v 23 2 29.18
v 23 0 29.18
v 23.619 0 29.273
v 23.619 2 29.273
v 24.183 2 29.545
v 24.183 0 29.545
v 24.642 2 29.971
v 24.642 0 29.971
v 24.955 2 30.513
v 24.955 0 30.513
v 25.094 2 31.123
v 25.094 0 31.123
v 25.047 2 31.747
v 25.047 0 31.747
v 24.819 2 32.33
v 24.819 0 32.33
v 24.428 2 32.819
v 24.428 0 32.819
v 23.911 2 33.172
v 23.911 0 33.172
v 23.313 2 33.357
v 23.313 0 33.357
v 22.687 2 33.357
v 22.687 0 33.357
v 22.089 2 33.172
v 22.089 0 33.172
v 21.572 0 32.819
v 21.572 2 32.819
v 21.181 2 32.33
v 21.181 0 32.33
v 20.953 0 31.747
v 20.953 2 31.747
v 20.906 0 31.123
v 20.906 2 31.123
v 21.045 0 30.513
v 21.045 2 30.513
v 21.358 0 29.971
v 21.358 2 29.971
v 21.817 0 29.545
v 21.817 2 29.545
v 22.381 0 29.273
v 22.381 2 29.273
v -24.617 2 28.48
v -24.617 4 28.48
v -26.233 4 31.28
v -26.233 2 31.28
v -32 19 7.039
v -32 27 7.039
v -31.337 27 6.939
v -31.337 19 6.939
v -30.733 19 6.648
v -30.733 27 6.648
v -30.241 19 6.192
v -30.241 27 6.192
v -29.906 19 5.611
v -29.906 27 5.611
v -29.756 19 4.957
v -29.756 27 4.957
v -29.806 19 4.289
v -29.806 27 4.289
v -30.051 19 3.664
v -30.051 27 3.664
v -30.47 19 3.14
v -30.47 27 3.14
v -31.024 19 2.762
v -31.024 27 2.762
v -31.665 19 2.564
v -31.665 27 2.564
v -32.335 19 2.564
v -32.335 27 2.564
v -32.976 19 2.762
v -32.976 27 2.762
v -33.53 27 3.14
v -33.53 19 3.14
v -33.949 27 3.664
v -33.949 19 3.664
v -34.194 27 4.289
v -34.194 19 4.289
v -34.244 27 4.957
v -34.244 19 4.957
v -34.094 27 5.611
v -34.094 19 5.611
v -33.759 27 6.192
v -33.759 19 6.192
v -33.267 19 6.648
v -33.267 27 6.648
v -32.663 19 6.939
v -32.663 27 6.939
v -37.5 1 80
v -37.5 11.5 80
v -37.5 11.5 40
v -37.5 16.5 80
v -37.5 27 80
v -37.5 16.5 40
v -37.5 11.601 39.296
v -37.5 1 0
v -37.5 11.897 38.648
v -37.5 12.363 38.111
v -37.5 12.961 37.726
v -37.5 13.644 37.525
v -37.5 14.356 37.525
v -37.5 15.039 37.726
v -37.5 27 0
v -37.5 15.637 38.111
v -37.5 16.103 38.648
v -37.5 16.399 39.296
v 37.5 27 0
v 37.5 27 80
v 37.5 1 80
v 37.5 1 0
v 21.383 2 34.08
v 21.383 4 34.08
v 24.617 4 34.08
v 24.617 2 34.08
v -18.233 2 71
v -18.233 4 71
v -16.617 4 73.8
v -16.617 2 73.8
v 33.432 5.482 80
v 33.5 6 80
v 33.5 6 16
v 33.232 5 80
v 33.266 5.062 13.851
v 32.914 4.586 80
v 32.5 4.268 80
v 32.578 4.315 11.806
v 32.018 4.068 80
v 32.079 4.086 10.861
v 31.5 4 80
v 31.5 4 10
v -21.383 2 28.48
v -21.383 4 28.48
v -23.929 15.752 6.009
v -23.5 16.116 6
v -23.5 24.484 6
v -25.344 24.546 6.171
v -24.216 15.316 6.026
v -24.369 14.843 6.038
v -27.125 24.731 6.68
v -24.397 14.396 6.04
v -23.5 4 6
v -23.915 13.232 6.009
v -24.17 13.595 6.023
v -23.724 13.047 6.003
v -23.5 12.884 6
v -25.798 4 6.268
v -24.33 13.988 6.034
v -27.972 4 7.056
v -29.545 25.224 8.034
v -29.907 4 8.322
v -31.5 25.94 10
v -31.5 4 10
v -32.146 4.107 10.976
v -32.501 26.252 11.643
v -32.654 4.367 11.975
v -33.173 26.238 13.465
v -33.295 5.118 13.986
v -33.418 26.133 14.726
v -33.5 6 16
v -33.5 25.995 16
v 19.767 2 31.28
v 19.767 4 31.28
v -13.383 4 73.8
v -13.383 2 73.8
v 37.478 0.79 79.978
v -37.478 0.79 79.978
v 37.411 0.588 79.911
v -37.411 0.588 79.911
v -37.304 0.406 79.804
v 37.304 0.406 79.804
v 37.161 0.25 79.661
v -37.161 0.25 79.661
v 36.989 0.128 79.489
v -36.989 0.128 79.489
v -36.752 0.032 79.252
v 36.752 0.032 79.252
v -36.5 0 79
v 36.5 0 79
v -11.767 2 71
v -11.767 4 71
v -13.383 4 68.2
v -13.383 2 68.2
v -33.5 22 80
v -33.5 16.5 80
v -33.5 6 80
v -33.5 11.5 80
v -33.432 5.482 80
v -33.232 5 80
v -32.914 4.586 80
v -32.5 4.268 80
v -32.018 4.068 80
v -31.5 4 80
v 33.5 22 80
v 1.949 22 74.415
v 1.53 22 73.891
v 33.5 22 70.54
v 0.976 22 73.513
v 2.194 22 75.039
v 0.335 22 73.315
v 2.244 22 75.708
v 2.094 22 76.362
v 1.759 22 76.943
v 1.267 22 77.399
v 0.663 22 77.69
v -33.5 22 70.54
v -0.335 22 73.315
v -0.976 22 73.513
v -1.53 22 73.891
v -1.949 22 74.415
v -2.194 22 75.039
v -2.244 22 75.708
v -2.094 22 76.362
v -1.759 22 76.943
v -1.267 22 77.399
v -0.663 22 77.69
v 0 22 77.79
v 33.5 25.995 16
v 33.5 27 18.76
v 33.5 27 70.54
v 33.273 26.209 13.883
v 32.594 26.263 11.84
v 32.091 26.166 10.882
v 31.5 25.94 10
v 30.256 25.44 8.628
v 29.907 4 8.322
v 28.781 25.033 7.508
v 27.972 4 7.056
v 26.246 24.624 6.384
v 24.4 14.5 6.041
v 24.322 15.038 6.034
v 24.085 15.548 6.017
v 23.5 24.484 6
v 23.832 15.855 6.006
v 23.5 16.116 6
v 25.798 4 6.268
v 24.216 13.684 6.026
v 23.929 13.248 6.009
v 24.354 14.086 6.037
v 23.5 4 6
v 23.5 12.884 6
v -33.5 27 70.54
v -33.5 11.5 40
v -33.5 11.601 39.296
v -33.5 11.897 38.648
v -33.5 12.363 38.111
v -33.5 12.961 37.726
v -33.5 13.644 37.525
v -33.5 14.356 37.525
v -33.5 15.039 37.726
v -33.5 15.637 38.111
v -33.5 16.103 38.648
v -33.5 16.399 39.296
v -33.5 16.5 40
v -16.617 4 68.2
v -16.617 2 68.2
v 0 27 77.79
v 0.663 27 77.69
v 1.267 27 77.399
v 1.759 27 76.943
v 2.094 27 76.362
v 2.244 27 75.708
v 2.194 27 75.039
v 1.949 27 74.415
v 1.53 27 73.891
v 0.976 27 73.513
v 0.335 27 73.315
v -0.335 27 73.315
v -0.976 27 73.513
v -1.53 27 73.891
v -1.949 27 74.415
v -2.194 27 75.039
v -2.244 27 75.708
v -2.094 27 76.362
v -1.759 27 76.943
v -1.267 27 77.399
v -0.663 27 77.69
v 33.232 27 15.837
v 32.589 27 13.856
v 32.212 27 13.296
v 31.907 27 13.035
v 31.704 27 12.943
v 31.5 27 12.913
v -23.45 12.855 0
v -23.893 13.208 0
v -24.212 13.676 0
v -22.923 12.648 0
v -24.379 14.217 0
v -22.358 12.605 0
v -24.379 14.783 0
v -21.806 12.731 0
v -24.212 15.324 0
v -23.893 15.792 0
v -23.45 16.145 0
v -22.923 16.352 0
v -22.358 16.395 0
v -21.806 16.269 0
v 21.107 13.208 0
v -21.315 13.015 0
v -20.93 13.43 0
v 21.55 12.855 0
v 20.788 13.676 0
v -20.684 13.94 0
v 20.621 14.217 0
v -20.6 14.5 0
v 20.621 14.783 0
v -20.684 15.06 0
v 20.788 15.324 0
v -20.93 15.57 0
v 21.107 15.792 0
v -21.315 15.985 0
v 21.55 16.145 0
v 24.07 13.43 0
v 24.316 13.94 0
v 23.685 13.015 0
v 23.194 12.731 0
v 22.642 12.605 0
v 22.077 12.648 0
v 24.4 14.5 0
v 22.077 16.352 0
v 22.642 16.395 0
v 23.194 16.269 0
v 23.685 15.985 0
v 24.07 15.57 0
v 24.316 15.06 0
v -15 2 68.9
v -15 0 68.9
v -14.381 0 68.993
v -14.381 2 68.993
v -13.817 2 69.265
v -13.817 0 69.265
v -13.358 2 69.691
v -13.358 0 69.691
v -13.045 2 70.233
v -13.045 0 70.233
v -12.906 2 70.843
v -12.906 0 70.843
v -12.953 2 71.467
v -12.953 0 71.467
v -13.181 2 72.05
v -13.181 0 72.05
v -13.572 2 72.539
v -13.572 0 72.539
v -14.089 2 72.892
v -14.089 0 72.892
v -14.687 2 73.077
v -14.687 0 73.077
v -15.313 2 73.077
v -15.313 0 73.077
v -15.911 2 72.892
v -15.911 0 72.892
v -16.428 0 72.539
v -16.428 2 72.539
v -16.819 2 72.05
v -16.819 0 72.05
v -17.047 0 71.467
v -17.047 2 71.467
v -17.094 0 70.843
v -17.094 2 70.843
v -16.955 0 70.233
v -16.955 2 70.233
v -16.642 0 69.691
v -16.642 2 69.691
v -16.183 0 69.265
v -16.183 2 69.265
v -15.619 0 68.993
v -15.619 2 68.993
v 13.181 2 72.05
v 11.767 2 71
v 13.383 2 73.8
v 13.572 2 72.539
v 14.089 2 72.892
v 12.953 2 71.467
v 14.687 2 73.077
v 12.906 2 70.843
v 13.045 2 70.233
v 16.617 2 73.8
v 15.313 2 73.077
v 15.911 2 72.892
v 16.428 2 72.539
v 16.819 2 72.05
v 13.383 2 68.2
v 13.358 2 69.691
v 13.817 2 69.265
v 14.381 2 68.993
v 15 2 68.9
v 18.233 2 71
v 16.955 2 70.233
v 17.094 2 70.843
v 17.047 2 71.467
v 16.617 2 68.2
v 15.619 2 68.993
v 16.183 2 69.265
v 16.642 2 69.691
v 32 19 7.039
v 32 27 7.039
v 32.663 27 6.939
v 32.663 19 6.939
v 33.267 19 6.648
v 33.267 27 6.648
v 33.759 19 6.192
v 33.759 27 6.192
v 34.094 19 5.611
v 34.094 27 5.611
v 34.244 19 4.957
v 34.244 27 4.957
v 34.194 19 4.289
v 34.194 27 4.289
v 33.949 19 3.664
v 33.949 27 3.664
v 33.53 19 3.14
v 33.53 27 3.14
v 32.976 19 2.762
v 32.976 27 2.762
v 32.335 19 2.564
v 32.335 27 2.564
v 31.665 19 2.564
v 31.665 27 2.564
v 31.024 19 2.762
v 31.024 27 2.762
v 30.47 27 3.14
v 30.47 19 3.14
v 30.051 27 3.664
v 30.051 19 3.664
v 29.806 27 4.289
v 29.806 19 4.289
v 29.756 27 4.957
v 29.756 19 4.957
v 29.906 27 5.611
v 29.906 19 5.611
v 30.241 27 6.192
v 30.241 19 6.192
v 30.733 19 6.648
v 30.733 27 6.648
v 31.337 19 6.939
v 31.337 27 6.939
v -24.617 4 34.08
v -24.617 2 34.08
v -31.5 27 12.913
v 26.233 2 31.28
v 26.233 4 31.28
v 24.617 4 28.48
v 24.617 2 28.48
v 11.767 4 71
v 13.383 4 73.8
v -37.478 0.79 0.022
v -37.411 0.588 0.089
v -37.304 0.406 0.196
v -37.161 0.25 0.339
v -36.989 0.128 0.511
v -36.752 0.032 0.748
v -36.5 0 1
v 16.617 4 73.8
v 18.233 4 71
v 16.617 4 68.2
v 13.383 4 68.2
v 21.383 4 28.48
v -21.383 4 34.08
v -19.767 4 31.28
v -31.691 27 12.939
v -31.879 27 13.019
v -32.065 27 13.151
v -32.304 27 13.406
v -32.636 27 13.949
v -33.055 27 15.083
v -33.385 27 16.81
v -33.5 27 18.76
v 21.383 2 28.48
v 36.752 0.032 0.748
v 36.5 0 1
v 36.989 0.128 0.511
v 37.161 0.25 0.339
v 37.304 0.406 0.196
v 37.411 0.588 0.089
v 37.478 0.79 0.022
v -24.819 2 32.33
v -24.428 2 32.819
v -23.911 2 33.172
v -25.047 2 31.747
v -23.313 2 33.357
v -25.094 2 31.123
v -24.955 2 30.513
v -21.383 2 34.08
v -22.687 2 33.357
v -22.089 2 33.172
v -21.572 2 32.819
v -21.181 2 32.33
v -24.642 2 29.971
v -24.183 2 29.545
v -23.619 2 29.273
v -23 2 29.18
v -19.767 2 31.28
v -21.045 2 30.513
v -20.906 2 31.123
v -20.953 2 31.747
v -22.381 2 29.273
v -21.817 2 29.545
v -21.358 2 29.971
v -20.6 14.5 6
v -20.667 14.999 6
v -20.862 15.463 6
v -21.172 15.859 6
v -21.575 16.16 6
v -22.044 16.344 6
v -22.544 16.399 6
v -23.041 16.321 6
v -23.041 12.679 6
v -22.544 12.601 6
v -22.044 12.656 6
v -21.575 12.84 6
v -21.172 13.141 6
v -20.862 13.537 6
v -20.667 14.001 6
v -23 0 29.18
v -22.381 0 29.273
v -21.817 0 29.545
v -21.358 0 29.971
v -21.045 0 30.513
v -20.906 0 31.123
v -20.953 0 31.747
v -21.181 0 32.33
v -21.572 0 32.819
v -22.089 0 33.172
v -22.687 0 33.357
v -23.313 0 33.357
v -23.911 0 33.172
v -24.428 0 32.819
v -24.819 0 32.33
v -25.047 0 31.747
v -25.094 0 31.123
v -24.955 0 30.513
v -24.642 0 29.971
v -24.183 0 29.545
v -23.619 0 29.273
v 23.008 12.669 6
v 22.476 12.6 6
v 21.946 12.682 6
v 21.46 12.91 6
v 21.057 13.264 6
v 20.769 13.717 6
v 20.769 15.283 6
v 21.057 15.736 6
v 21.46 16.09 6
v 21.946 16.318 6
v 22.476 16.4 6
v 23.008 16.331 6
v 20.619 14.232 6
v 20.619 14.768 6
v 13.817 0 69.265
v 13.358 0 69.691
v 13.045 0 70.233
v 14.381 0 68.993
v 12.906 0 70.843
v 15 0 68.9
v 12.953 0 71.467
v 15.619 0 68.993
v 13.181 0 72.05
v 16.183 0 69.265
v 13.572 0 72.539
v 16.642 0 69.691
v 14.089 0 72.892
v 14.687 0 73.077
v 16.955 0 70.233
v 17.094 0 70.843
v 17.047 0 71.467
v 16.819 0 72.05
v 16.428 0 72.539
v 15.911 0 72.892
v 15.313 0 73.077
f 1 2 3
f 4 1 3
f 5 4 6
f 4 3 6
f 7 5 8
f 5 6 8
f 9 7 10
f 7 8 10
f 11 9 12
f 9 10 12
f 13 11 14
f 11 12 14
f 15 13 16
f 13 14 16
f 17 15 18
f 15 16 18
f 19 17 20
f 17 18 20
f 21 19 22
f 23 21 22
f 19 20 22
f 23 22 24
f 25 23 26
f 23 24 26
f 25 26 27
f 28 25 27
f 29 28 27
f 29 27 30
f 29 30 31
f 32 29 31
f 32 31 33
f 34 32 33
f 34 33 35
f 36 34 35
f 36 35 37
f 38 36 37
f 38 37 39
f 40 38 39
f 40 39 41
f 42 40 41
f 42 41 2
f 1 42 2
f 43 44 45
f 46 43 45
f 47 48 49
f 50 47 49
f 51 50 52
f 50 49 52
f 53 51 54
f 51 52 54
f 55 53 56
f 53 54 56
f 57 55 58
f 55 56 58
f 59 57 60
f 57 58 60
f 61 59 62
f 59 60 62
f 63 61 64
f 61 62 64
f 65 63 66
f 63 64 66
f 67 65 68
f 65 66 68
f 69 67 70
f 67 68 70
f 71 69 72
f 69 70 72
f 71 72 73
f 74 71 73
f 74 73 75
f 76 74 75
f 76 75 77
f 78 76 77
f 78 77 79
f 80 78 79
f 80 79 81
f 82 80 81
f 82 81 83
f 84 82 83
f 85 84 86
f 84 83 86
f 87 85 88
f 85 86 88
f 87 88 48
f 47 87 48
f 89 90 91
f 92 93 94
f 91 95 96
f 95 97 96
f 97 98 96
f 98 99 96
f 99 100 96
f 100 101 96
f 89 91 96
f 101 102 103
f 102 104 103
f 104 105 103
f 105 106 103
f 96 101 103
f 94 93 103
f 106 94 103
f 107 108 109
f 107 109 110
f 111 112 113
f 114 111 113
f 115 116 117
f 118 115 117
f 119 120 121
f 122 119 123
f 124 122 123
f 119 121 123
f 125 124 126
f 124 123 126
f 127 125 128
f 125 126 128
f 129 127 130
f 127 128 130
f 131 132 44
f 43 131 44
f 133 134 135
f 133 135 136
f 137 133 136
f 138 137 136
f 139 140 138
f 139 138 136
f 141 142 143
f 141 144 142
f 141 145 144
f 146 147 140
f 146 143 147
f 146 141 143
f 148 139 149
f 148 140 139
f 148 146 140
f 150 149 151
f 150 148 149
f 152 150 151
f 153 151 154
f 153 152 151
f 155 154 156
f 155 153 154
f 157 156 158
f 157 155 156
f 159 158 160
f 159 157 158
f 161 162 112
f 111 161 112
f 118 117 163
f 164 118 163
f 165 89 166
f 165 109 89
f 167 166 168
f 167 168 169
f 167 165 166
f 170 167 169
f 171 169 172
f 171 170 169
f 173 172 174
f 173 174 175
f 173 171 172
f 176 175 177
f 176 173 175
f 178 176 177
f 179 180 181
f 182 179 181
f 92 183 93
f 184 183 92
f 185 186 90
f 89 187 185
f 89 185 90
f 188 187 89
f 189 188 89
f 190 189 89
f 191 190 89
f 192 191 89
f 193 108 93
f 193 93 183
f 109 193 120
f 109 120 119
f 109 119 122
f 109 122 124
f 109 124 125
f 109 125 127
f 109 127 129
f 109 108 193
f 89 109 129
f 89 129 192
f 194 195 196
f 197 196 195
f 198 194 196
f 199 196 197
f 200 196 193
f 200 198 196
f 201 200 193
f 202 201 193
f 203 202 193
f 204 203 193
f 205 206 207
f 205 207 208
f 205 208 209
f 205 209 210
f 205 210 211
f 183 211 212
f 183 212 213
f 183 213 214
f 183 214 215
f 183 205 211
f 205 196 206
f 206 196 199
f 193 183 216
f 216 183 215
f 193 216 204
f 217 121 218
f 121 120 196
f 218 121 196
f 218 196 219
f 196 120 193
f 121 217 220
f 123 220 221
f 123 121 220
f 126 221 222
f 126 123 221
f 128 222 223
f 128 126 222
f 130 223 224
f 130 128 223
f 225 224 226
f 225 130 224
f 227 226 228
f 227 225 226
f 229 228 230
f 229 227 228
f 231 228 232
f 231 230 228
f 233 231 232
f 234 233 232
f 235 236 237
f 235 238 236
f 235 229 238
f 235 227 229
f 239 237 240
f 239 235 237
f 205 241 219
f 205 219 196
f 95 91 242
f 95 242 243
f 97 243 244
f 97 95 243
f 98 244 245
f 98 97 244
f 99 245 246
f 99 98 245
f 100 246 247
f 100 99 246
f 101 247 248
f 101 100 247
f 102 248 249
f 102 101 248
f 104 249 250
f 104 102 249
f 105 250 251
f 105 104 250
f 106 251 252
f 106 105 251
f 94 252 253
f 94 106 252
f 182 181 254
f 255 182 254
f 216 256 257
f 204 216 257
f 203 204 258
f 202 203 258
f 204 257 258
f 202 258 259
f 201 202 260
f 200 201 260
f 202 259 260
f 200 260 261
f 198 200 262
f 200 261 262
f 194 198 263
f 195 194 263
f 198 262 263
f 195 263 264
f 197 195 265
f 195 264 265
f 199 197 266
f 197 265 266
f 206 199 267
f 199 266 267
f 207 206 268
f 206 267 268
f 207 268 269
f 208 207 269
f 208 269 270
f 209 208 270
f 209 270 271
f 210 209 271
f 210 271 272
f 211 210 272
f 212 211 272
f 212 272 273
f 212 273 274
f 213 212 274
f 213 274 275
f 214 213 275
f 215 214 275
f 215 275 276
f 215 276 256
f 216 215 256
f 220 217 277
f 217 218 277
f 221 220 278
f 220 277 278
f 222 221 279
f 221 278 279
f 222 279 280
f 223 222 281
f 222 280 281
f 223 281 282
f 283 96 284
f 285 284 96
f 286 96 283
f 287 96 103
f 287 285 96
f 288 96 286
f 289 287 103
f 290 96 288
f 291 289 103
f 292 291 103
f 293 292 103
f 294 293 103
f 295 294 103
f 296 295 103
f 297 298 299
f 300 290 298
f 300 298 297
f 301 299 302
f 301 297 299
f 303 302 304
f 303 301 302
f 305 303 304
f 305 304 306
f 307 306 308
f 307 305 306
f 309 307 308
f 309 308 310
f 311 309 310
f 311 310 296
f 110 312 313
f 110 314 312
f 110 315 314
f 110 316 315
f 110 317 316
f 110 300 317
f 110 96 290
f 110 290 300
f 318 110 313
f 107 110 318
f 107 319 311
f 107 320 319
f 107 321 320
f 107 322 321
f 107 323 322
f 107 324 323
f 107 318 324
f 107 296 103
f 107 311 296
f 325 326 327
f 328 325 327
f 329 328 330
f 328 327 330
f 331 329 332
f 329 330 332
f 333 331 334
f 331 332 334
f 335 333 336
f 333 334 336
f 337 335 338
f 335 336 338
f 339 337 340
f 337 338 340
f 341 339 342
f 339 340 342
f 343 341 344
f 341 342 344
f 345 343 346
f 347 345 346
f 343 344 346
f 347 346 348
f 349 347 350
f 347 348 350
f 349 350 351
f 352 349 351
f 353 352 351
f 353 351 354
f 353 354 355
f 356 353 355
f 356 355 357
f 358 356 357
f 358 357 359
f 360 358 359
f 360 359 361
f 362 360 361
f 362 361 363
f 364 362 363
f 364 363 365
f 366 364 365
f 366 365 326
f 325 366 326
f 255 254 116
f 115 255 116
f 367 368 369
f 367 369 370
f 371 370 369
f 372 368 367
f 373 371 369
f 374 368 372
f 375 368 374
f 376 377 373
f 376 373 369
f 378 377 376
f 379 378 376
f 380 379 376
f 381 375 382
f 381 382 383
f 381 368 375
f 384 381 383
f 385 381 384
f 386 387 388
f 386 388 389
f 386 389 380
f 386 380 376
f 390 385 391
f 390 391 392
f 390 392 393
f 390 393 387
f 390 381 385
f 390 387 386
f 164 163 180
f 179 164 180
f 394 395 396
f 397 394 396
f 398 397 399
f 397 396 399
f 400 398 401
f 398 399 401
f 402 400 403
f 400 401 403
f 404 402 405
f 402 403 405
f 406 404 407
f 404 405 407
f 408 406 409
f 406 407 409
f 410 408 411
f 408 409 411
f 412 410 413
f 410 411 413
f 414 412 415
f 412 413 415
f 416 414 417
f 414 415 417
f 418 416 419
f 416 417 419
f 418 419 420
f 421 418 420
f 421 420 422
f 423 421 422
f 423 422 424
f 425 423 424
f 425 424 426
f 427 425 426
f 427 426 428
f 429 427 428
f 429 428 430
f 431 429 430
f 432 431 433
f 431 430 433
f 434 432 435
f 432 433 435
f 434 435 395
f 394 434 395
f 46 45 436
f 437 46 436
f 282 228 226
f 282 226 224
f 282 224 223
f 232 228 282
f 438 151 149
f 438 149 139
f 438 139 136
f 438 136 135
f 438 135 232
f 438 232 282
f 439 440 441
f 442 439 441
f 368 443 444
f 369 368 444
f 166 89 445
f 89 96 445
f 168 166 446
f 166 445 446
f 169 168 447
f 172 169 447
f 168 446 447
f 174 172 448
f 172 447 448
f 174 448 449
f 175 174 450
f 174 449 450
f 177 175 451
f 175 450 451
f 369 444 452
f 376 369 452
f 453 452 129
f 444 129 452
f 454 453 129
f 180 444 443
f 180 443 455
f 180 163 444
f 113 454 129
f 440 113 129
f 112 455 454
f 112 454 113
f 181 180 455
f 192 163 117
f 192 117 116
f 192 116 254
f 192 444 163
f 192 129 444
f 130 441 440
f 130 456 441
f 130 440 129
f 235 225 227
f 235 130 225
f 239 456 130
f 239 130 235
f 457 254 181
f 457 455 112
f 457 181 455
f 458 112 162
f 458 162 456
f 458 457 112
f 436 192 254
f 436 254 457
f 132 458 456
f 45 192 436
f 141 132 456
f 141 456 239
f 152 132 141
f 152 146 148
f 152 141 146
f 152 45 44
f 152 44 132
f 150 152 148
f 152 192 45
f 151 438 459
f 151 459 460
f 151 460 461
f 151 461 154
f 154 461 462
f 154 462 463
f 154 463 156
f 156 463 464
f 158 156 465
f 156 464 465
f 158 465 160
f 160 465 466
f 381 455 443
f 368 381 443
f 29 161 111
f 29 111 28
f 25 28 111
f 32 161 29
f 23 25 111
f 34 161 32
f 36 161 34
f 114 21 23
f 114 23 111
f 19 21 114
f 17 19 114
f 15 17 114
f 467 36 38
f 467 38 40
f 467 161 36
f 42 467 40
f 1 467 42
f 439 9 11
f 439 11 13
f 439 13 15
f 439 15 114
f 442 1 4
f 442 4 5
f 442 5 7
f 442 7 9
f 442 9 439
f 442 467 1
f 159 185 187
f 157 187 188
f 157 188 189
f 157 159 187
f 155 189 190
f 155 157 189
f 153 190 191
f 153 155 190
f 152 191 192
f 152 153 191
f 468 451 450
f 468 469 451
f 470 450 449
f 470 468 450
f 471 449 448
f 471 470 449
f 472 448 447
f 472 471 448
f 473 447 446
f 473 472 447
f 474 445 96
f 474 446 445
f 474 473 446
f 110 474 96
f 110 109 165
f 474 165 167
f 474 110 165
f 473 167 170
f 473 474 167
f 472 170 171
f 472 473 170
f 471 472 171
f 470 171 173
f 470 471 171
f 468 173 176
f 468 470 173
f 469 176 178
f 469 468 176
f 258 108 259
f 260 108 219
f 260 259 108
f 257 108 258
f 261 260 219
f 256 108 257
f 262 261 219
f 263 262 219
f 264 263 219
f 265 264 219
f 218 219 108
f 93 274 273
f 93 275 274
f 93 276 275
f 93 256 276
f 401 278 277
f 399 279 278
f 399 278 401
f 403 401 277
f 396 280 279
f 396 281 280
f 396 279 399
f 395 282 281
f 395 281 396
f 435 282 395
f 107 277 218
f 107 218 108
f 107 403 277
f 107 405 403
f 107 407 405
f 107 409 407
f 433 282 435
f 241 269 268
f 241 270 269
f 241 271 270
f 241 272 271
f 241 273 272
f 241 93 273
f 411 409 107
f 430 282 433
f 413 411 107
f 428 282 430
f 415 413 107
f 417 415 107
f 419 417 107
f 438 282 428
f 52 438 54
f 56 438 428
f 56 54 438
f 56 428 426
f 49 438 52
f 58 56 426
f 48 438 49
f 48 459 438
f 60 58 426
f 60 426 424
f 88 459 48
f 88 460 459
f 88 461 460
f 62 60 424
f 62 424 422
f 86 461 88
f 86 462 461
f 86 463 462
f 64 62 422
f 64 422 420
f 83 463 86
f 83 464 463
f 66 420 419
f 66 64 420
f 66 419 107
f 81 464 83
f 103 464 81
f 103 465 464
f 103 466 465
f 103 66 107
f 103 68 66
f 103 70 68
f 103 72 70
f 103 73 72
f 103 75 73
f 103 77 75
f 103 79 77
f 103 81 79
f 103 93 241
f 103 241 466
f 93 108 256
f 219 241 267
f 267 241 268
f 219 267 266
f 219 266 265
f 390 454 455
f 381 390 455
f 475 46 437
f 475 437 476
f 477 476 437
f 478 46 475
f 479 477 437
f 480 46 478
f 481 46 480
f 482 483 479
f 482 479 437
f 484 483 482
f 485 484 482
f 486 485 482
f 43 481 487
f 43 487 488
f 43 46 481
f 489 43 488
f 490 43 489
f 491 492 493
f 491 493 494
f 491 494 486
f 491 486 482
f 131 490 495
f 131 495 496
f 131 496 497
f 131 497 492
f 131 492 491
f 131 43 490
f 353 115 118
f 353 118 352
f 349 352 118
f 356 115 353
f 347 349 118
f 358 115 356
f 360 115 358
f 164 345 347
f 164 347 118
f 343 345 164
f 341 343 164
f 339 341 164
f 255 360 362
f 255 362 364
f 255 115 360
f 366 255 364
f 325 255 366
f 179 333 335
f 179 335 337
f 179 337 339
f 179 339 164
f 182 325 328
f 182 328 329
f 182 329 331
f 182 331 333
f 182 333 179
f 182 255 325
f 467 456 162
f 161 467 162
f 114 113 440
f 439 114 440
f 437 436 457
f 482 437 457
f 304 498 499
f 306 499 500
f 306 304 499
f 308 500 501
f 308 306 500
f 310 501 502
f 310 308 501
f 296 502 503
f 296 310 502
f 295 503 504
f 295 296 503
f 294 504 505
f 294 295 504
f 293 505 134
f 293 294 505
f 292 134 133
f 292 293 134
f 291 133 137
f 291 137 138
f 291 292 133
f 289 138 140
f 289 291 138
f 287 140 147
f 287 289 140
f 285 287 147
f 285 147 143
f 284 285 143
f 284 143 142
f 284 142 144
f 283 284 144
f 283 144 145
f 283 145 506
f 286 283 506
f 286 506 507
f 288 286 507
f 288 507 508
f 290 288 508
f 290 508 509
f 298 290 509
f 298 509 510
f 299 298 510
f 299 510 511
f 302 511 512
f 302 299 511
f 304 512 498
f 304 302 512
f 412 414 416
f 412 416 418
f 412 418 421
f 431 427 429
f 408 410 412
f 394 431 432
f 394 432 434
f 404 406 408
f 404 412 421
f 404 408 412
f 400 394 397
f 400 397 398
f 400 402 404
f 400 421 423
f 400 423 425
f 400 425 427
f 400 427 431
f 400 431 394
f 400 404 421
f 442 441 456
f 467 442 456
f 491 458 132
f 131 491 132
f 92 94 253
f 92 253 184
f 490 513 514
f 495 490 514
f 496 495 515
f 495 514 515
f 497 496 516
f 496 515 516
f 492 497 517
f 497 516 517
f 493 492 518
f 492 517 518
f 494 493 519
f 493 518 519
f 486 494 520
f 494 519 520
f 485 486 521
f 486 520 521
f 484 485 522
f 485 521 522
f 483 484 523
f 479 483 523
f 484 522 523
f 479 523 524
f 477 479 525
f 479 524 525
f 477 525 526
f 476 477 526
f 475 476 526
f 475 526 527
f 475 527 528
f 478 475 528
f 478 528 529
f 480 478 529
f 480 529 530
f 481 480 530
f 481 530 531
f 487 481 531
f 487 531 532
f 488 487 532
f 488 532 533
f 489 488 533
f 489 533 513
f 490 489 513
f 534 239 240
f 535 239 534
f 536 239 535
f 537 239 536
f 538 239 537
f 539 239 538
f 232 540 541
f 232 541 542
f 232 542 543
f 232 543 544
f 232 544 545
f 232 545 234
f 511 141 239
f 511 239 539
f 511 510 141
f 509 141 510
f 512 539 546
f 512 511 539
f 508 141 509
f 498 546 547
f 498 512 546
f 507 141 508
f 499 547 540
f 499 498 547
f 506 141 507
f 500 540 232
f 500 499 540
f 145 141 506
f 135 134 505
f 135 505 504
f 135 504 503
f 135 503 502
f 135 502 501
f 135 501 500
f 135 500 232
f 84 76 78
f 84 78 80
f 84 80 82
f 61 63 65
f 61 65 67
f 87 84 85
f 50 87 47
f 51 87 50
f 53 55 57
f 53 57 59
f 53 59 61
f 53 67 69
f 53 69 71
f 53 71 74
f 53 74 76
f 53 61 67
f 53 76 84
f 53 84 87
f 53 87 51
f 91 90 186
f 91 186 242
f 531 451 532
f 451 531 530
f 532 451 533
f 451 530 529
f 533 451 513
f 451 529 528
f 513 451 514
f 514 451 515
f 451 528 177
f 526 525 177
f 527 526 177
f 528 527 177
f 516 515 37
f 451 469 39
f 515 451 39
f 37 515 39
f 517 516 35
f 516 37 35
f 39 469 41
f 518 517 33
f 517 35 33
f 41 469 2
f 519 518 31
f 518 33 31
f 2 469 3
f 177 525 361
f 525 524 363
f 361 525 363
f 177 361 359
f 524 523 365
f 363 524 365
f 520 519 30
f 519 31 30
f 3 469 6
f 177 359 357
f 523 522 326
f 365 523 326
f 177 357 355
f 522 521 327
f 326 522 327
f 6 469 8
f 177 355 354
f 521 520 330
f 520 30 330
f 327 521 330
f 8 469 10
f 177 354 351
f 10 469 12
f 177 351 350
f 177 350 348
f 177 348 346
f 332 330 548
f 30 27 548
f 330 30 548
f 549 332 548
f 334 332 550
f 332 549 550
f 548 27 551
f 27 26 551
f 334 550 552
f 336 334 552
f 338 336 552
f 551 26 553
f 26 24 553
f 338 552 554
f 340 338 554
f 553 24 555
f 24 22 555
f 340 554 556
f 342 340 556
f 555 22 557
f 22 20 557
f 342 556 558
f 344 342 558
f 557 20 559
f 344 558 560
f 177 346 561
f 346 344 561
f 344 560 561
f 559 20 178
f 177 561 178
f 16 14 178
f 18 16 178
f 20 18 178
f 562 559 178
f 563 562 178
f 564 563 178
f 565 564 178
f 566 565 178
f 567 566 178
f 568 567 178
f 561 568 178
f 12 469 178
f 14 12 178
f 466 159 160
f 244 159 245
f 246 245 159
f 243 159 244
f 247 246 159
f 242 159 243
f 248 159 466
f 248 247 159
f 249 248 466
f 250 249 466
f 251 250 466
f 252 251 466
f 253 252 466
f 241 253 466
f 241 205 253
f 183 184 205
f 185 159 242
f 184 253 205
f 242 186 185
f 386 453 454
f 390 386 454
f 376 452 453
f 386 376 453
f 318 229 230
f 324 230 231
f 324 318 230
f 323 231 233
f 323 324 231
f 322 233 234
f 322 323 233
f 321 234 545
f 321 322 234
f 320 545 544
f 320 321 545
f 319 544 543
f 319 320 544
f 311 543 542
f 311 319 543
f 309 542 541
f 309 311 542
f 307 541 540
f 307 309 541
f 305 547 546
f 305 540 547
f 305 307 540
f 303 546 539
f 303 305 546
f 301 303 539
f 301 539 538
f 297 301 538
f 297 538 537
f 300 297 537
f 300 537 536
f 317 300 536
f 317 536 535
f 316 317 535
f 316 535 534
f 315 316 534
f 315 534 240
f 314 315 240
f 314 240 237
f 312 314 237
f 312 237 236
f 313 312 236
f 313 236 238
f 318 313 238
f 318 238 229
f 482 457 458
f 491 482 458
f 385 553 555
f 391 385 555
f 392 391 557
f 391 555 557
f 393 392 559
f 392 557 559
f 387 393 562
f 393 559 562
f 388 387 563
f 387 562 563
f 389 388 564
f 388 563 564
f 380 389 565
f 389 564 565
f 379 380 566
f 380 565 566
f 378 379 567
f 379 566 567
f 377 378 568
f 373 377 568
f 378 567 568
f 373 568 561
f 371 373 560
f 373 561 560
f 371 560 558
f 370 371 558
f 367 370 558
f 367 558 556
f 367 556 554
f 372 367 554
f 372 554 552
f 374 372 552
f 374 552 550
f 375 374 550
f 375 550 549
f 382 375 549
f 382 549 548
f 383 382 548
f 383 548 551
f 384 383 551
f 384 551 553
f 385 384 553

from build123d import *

# Parameters (mm, degrees)
EXTRUDE_1_DEPTH          = 37.5
SHELL_START              = -33.5
SHELL_1_DEPTH            = 67
FILLET_1_R               = 5
FILLET_3_R               = 2
FILLET_4_R               = 1
FILLET_5_R               = 10
CUT_EXTRUDE_2_DEPTH      = 94.307288118
CUT_EXTRUDE_2_DEPTH_BACK = 3
SKETCH_3_R               = 1.9
CUT_EXTRUDE_1_DEPTH      = 103.419810279
CUT_EXTRUDE_1_DEPTH_BACK = 103.419810279
SKETCH_2_W               = 80
SKETCH_2_H               = 35
SKETCH_5_R               = 2.25
CUT_EXTRUDE_4_DEPTH      = 8
CUT_EXTRUDE_5_DEPTH      = 88.242478302
CUT_EXTRUDE_5_DEPTH_BACK = 88.242478302
SKETCH_6_R               = 1.9
CUT_EXTRUDE_6_REACH      = 114.934
CUT_EXTRUDE_7_REACH      = 94.386
SKETCH_8_R               = 2.1
CUT_EXTRUDE_8_DEPTH      = 2


# Read off the part's stored shape, not the designer's step: 抽壳1
with BuildPart() as part:
    # 草图1 → 凸台-拉伸1 (new, symmetric)
    with BuildSketch(Plane(origin=(0, 0, 0), x_dir=(0, 0, -1), z_dir=(1, 0, 0))):
        Polygon((-70.540010176, 52.231309316), (-70.540010176, 30), (-80, 30), (-80, 0), (0, 0), (0, 30), (-9.459989824, 30), align=None)
    extrude(amount=EXTRUDE_1_DEPTH, both=True)

    # 抽壳1 outline → 抽壳1 (cut)
    with BuildSketch(Plane.YZ.offset(SHELL_START)):
        Polygon((47.974598226, 70.540010176), (22, 70.540010176), (22, 80), (4, 80), (4, 6), (24.483955603, 6), align=None)
    extrude(amount=SHELL_1_DEPTH, mode=Mode.SUBTRACT)

    # 圆角1
    fillet_1_edges = [part.edges().sort_by_distance(p)[0] for p in [
        (0, 30, 9.459989824),
        (35.5, 30, 70.540010176),
        (-35.5, 30, 70.540010176),
    ]]
    fillet(fillet_1_edges, radius=FILLET_1_R)

    # 圆角3
    fillet_3_edges = [part.edges().sort_by_distance(p)[0] for p in [
        (33.5, 4, 43),
        (33.5, 36.229276914, 38.270005088),
        (-33.5, 36.229276914, 38.270005088),
        (-33.5, 4, 43),
    ]]
    fillet(fillet_3_edges, radius=FILLET_3_R)

    # 圆角4
    fillet_4_edges = [part.edges().sort_by_distance(p)[0] for p in [
        (-37.5, 30, 4.28917746),
        (-37.5, 30.075961235, 9.446595809),
        (37.5, 30, 4.28917746),
        (37.5, 30.075961235, 9.446595809),
        (-37.5, 41.266423106, 40.414232907),
        (0, 52.231309316, 70.540010176),
        (37.5, 41.266423106, 40.414232907),
        (37.5, 0, 40),
        (-37.5, 0, 40),
        (0, 0, 80),
        (0, 0, 0),
        (0, 30, 0),
        (0, 30, 80),
    ]]
    fillet(fillet_4_edges, radius=FILLET_4_R)

    # 圆角5
    # the kernel refuses this fillet: 10 mm, written as the material it adds along each edge
    with BuildSketch(Plane(origin=(33.5, -19, 6), x_dir=(0, 0, 1), z_dir=(0, 1, 0))) as fillet_5_piece_1_section:
        with BuildLine():
            CenterArc((FILLET_5_R, -FILLET_5_R), FILLET_5_R, 90, 90)
            Line((0, -FILLET_5_R), (0, 0))
            Line((0, 0), (FILLET_5_R, 0))
        make_face()
    fillet_5_piece_1 = extrude(amount=66.355600058, mode=Mode.PRIVATE)
    fillet_5_piece_1 = split(fillet_5_piece_1, bisect_by=Plane(origin=(31.283756862, 30, 8.259643185), z_dir=(0, -1, 0)), keep=Keep.TOP, mode=Mode.PRIVATE)
    fillet_5_piece_1 = split(fillet_5_piece_1, bisect_by=Plane(origin=(31.283756862, 0, 8.259643185), z_dir=(0, 1, 0)), keep=Keep.TOP, mode=Mode.PRIVATE)
    add(fillet_5_piece_1)
    with BuildSketch(Plane(origin=(-33.5, -19, 6), x_dir=(0, 0, 1), z_dir=(0, 1, 0))) as fillet_5_piece_2_section:
        with BuildLine():
            CenterArc((FILLET_5_R, FILLET_5_R), FILLET_5_R, 180, 90)
            Line((0, FILLET_5_R), (0, 0))
            Line((0, 0), (FILLET_5_R, 0))
        make_face()
    fillet_5_piece_2 = extrude(amount=66.355600058, mode=Mode.PRIVATE)
    fillet_5_piece_2 = split(fillet_5_piece_2, bisect_by=Plane(origin=(-31.283756862, 30, 8.259643185), z_dir=(0, -1, 0)), keep=Keep.TOP, mode=Mode.PRIVATE)
    fillet_5_piece_2 = split(fillet_5_piece_2, bisect_by=Plane(origin=(-31.283756862, 0, 8.259643185), z_dir=(0, 1, 0)), keep=Keep.TOP, mode=Mode.PRIVATE)
    add(fillet_5_piece_2)

    # 草图3 → 切除-拉伸2 (cut, two sides: drawn at the far end of the back side and taken through both)
    with BuildSketch(Plane(origin=(0, 30, 0), x_dir=(1, 0, 0), z_dir=(0, 1, 0)).offset(-CUT_EXTRUDE_2_DEPTH_BACK)):
        with Locations(Location((-32, -4.78917746, 0), (0, 0, 90))):
            Circle(SKETCH_3_R)
        with Locations(Location((32, -4.78917746, 0), (0, 0, 90))):
            Circle(SKETCH_3_R)
        with Locations(Location((0, -75.540010176, 0), (0, 0, 90))):
            Circle(SKETCH_3_R)
    extrude(amount=CUT_EXTRUDE_2_DEPTH + CUT_EXTRUDE_2_DEPTH_BACK, mode=Mode.SUBTRACT)

    # 草图2 → 切除-拉伸1 (cut, two sides: drawn at the far end of the back side and taken through both)
    with BuildSketch(Plane(origin=(0, 0, 0), x_dir=(0, 0, -1), z_dir=(1, 0, 0)).offset(-CUT_EXTRUDE_1_DEPTH_BACK)):
        with Locations((-40, 44.5)):
            Rectangle(SKETCH_2_W, SKETCH_2_H)
    extrude(amount=CUT_EXTRUDE_1_DEPTH + CUT_EXTRUDE_1_DEPTH_BACK, mode=Mode.SUBTRACT)

    # 草图5 → 切除-拉伸4 (cut)
    with BuildSketch(Plane(origin=(0, 27, 0), x_dir=(1, 0, 0), z_dir=(0, 1, 0))):
        with Locations(Location((0, -75.540010176, 0), (0, 0, 270))):
            Circle(SKETCH_5_R)
        with Locations(Location((32, -4.78917746, 0), (0, 0, 270))):
            Circle(SKETCH_5_R)
        with Locations(Location((-32, -4.78917746, 0), (0, 0, 270))):
            Circle(SKETCH_5_R)
    extrude(amount=-CUT_EXTRUDE_4_DEPTH, mode=Mode.SUBTRACT)

    # 草图6 → 切除-拉伸5 (cut, two sides: drawn at the far end of the back side and taken through both)
    with BuildSketch(Plane.XY.offset(6).offset(-CUT_EXTRUDE_5_DEPTH_BACK)):
        with Locations((-22.5, 14.5)):
            Circle(SKETCH_6_R)
        with Locations((22.5, 14.5)):
            Circle(SKETCH_6_R)
    extrude(amount=CUT_EXTRUDE_5_DEPTH + CUT_EXTRUDE_5_DEPTH_BACK, mode=Mode.SUBTRACT)

    # 草图7 → 切除-拉伸6 (cut, up to next)
    with BuildSketch(Plane.ZY.offset(37.5), mode=Mode.PRIVATE) as cut_extrude_6_sk1:
        with BuildLine():
            Line((40, 16.5), (80, 16.5))
            ThreePointArc((80, 16.5), (82.5, 14), (80, 11.5))
            Line((80, 11.5), (40, 11.5))
            ThreePointArc((40, 11.5), (37.5, 14), (40, 16.5))
        make_face()
    cut_extrude_6_tool1 = extrude(cut_extrude_6_sk1.sketch, amount=-CUT_EXTRUDE_6_REACH, mode=Mode.PRIVATE) & part.part
    add(cut_extrude_6_tool1.solids().sort_by_distance((-37.5, 14, 60))[0], mode=Mode.SUBTRACT)

    # 草图8 → 切除-拉伸7 (cut, up to next)
    with BuildSketch(Plane.XZ, mode=Mode.PRIVATE) as cut_extrude_7_sk1:
        with Locations(Location((23, 31.28, 0), (0, 0, 270))):
            Circle(SKETCH_8_R)
    cut_extrude_7_tool1 = extrude(cut_extrude_7_sk1.sketch, amount=-CUT_EXTRUDE_7_REACH, mode=Mode.PRIVATE) & part.part
    # 草图8 → 切除-拉伸7 (cut, up to next)
    with BuildSketch(Plane.XZ, mode=Mode.PRIVATE) as cut_extrude_7_sk2:
        with Locations(Location((15, 71, 0), (0, 0, 270))):
            Circle(SKETCH_8_R)
    cut_extrude_7_tool2 = extrude(cut_extrude_7_sk2.sketch, amount=-CUT_EXTRUDE_7_REACH, mode=Mode.PRIVATE) & part.part
    # 草图8 → 切除-拉伸7 (cut, up to next)
    with BuildSketch(Plane.XZ, mode=Mode.PRIVATE) as cut_extrude_7_sk3:
        with Locations(Location((-15, 71, 0), (0, 0, 270))):
            Circle(SKETCH_8_R)
    cut_extrude_7_tool3 = extrude(cut_extrude_7_sk3.sketch, amount=-CUT_EXTRUDE_7_REACH, mode=Mode.PRIVATE) & part.part
    # 草图8 → 切除-拉伸7 (cut, up to next)
    with BuildSketch(Plane.XZ, mode=Mode.PRIVATE) as cut_extrude_7_sk4:
        with Locations(Location((-23, 31.28, 0), (0, 0, 270))):
            Circle(SKETCH_8_R)
    cut_extrude_7_tool4 = extrude(cut_extrude_7_sk4.sketch, amount=-CUT_EXTRUDE_7_REACH, mode=Mode.PRIVATE) & part.part
    add(cut_extrude_7_tool1.solids().sort_by_distance((23, 0, 31.28))[0], mode=Mode.SUBTRACT)
    add(cut_extrude_7_tool2.solids().sort_by_distance((15, 0, 71))[0], mode=Mode.SUBTRACT)
    add(cut_extrude_7_tool3.solids().sort_by_distance((-15, 0, 71))[0], mode=Mode.SUBTRACT)
    add(cut_extrude_7_tool4.solids().sort_by_distance((-23, 0, 31.28))[0], mode=Mode.SUBTRACT)

    # 草图9 → 切除-拉伸8 (cut)
    with BuildSketch(Plane(origin=(0, 4, 0), x_dir=(1, 0, 0), z_dir=(0, 1, 0))):
        Polygon((18.233161507, -71), (16.616580754, -68.2), (13.383419246, -68.2), (11.766838493, -71), (13.383419246, -73.8), (16.616580754, -73.8), align=None)
        Polygon((-11.766838493, -71), (-13.383419246, -68.2), (-16.616580754, -68.2), (-18.233161507, -71), (-16.616580754, -73.8), (-13.383419246, -73.8), align=None)
        Polygon((26.233161507, -31.28), (24.616580754, -28.48), (21.383419246, -28.48), (19.766838493, -31.28), (21.383419246, -34.08), (24.616580754, -34.08), align=None)
        Polygon((-26.233161507, -31.28), (-24.616580754, -34.08), (-21.383419246, -34.08), (-19.766838493, -31.28), (-21.383419246, -28.48), (-24.616580754, -28.48), align=None)
    extrude(amount=-CUT_EXTRUDE_8_DEPTH, mode=Mode.SUBTRACT)


solid = part.part
